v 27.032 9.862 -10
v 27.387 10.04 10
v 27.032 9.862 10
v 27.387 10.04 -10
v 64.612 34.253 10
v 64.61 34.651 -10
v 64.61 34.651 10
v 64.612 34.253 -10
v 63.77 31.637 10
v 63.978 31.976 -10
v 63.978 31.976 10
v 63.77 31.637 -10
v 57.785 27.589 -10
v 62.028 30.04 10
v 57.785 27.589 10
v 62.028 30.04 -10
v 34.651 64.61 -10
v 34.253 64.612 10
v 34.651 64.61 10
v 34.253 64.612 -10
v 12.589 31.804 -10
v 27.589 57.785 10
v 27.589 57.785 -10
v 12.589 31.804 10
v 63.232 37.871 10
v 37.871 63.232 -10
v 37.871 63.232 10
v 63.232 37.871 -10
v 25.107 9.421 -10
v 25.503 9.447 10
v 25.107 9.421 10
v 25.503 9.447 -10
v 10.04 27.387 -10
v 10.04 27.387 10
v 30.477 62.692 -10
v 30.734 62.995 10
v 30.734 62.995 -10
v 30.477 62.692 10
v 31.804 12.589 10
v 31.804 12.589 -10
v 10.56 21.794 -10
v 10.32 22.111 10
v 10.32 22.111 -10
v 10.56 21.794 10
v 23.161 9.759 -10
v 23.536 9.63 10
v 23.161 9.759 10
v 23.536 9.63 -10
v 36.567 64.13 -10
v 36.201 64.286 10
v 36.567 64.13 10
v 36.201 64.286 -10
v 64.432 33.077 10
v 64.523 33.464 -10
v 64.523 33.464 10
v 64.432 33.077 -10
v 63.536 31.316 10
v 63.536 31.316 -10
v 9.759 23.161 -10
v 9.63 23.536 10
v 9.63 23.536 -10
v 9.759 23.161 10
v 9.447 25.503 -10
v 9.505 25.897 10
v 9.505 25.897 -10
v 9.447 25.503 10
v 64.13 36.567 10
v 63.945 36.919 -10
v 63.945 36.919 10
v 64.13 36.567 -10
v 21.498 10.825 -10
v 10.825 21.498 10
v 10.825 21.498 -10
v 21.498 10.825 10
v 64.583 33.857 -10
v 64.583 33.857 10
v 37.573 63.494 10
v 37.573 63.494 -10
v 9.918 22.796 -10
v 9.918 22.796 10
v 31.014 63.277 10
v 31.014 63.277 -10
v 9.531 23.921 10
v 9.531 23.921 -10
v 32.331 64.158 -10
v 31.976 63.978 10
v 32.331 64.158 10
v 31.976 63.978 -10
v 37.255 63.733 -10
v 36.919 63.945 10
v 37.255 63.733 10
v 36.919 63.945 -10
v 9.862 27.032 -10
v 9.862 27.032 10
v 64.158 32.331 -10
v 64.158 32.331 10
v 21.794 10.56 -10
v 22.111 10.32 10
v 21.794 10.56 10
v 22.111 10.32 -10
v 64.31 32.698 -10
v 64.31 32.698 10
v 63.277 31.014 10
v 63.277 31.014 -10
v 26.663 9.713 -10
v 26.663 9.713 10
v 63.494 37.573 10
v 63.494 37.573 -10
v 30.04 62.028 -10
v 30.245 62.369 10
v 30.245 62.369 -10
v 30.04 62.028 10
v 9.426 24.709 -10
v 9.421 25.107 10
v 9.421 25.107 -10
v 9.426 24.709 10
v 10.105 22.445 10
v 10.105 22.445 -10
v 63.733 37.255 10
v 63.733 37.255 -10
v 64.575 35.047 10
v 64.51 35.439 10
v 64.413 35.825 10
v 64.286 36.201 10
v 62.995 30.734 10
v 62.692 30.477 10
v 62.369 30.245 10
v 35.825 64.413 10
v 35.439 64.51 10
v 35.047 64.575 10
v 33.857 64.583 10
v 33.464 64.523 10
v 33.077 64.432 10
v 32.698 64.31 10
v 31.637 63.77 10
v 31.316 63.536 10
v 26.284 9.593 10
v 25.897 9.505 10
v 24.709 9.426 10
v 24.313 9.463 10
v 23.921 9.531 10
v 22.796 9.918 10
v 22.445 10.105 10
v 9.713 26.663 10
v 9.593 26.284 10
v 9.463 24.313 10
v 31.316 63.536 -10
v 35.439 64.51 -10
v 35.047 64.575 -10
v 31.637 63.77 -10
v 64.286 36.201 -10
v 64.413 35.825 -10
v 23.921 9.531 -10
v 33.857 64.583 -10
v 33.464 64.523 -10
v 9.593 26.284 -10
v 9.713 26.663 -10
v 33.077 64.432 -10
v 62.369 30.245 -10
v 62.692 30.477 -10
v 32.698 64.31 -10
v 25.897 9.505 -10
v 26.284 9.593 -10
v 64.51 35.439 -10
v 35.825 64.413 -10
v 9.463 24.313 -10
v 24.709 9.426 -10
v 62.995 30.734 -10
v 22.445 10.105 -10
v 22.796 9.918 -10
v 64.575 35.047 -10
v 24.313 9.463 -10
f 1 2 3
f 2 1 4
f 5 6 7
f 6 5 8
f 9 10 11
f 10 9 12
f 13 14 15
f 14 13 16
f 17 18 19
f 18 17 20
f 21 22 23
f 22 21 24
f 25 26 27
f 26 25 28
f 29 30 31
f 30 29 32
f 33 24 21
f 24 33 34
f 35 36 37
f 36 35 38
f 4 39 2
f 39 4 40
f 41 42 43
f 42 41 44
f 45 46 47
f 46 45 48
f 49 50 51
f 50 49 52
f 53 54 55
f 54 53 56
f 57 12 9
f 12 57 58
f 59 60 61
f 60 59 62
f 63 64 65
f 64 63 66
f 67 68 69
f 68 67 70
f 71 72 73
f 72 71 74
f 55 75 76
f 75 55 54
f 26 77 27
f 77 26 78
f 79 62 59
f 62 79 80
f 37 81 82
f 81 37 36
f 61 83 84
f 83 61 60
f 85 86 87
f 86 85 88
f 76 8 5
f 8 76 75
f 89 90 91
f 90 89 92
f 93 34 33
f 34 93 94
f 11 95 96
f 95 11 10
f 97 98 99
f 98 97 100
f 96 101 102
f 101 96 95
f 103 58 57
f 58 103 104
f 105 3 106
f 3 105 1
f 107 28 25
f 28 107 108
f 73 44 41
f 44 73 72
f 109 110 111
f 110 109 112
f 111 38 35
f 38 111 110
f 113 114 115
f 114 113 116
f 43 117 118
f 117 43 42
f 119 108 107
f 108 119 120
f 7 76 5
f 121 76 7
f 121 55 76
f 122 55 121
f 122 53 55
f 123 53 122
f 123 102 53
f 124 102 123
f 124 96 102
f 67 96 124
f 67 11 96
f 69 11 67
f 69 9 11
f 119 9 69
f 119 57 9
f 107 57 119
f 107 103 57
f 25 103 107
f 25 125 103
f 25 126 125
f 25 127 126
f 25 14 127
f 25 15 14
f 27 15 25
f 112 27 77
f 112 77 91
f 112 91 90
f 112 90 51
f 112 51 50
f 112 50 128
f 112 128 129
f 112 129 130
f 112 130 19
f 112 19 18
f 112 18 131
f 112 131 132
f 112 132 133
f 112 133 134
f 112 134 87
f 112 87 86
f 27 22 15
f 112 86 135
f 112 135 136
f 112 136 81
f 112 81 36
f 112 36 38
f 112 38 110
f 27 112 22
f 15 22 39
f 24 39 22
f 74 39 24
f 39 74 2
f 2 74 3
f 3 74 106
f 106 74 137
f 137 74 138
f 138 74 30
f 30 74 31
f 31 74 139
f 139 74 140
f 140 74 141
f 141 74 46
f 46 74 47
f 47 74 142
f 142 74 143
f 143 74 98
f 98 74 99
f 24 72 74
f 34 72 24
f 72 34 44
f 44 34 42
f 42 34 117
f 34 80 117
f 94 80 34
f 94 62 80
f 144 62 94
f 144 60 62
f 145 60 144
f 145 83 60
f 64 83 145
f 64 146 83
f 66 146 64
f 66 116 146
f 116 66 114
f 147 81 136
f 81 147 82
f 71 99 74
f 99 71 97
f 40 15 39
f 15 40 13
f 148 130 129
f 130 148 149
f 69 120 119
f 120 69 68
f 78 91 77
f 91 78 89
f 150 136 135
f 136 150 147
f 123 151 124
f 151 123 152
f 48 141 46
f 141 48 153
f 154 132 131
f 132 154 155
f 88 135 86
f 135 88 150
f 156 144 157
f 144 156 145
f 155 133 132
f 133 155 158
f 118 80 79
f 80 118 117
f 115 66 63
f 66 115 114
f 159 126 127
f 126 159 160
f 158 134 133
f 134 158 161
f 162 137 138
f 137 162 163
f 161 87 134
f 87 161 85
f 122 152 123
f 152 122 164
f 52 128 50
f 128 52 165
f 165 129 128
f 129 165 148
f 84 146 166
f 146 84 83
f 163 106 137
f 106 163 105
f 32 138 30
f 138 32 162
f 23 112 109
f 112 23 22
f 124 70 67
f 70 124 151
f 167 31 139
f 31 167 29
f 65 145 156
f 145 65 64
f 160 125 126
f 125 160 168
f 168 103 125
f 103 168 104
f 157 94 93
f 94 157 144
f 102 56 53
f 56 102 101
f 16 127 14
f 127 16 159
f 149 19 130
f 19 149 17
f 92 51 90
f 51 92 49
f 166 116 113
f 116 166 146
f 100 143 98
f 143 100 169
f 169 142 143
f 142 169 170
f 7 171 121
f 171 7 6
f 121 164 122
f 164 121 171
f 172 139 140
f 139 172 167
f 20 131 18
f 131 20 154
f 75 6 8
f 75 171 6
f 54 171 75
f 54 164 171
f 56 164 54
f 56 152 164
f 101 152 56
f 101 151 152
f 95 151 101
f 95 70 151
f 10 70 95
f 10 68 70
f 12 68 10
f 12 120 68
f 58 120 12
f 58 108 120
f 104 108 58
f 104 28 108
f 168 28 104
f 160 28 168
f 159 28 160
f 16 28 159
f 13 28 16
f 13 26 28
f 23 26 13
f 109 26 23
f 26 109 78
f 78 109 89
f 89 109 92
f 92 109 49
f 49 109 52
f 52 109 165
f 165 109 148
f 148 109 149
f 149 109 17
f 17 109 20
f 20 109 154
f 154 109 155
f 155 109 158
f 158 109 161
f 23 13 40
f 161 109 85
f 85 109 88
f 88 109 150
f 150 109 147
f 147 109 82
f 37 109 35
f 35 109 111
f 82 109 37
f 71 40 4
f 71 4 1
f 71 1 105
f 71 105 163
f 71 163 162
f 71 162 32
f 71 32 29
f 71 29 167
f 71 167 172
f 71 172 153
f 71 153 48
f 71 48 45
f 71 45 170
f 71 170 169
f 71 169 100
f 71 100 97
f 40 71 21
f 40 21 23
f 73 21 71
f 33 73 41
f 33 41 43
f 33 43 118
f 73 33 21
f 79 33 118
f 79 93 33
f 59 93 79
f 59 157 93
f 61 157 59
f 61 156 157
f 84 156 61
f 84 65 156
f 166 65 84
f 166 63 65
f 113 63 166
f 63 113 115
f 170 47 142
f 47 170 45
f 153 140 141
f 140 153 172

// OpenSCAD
include <MCAD/bearing.scad>

// ---------------------------
// Constants
// ---------------------------
$fa = 1;
$fs = 0.4;
in_to_mm = 25.4;
gap = 1.25; //1/32 * in_to_mm;
nut_gap = 7;//3/4 * in_to_mm;
eps = .15;

bearingModel = 608; //608
bearing_w = bearingWidth(bearingModel);
bearing_or = bearingOuterDiameter(bearingModel)/2;
bearing_ir = bearingInnerDiameter(bearingModel)/2;


// ---------------------------
// Variables
// ---------------------------
num_holes=12;
sectors = num_holes;
sector_degrees = 360 / sectors;

mag1_hole_d = (4/8 * in_to_mm);
mag1_hole_r = (mag1_hole_d/2);
mag1_w = 5;//1/4 * in_to_mm;

mag2_hole_d = (2/8 * in_to_mm);
mag2_hole_r = (mag2_hole_d/2);
mag2_w = 1/4 * in_to_mm;

mag3_hole_d = (1/8 * in_to_mm);
mag3_hole_r = (mag3_hole_d/2);
mag3_w = 1/4 * in_to_mm;

mag_space_1 = 4;
mag_space_2 = 4;

cir = num_holes*2*5;//num_holes*2*(mag1_hole_d-mag_space_2/2);
temp_r = cir/(3.14159*2);
min_r = bearing_or + mag1_hole_d + mag2_hole_d;// + mag_space_2+3;
central_r3 = max(temp_r, min_r);
central_r2 = central_r3 + mag3_hole_r + mag_space_2 + mag2_hole_r;
central_r = central_r2 + mag2_hole_r + mag_space_1 + mag1_hole_r;
disk_r = central_r+2;

coil_cap_w = .6;
coil_w = bearing_w-1;//5;//(1/8 * in_to_mm = 3.175);
coil_hole_r = mag1_hole_r*3;
coil_hole_d = coil_hole_r*2;
coil_holder_r = mag1_hole_r;
coil_holder_bolt_r = 2;
coil_holder_top_insert_h = 1;
coil_holder_inner_shell_t = 2;
coil_holder_center_cyl_t = 1.5;
coil_center_hole_r = bearing_or+eps; //7

coil_holder_hull_r = 1;
wire_size = 2.5;//mag1_hole_r-5;
coil_holder_out_r1 = central_r3-wire_size;//-mag2_hole_r;
coil_holder_out_x1 = coil_holder_out_r1-coil_holder_hull_r/num_holes;
coil_holder_out_y1 = wire_size-coil_holder_hull_r;
coil_holder_out_r2 = central_r+mag1_hole_d+mag_space_1;
coil_holder_out_x2 = coil_holder_out_r2;
coil_holder_out_y2 = wire_size-coil_holder_hull_r;

coil_holder_in_x1 = coil_holder_out_r1+wire_size*2+coil_holder_hull_r/2;
coil_holder_in_y1 = wire_size+coil_holder_hull_r;
coil_holder_in_x2 = coil_holder_out_r2-wire_size-coil_holder_hull_r*2;
coil_holder_in_y2 = wire_size+coil_holder_hull_r;
coil_holder_in_len = coil_holder_in_x2 - coil_holder_in_x1 + coil_holder_hull_r*2;
echo(str("coil_holder_in_len:", coil_holder_in_len));

base_d = 170;
base_r = base_d/2;  //central_r + coil_hole_d;
base_w = 3; //bearing_w/1.75
base_l = 70; //3.5 * in_to_mm; 66.4
base_lc = nut_gap + gap + mag2_w + gap + coil_w +gap + mag1_w + gap + coil_w + gap + mag1_w + gap + coil_w + gap + mag2_w + gap + nut_gap;
base_side_h = 15;
alignment_bolt_r = 3.9/2;

axel_h = gap+coil_w+gap;
axel_ir = bearing_ir+.1;
axel_or = coil_center_hole_r-1;

echo(str("sector_degrees:", sector_degrees));
echo(str("coil_w:", coil_w));
echo(str("bearing_w:", bearing_w));
echo(str("mag1_w:", mag1_w));
echo(str("mag1_hole_r:", mag1_hole_r));
echo(str("disk_r:", disk_r));

render_mode = "JOE"; //"FULL", "PRINT", "TEST";
print_mode = "MAG1"; //"MAG1","COIL","HOLDERS","BASE";

//%translate([0,0,10])coilDisk(diskNum=1, bearing=true);
//barMagDisk();
//printCoilHolderTopAndBot();

//square([30,10], center=true);
barMagCoilHolderOuterHull();

//barMagDisk();
//%coilHoldersVisual();

// Disk
module barMagDisk() {
    border = mag1_hole_r;
    mag1_disk_r = central_r + border+11.5;
    w=mag1_w;
    
    difference() {
        cylinder(h=w,r=mag1_disk_r,center=true);
        //remove holes for outer magnets
        barMagHoles(mag1_disk_r, border);
        //remove hole for main axel
        cylinder(h=w*2,r=axel_ir,center=true);
    }
}

module barMagHole(r,b,x=30,y=10,z=20) {
    translate([r-(x/2)-b,0,0])cube([x, y, z], center=true);
}

module barMagHoles(r,b,x=30,y=10,z=20) {
    sectors = num_holes;
    sector_degrees = 360 / sectors;
    for(sector = [1 : sectors]) {
        angle = sector_degrees * sector;
        rotate([0,0,angle])barMagHole(r,b,x,y,z);
    }    
}

module barMagCoilHolderOuterHull() {
    border = mag1_hole_r;
    mag1_disk_r = central_r + border+11.5;
    w=mag1_w;
    
    hull() {
        barMagCoilOutlines(mag1_disk_r, border);
    }
    hull() {
        barMagCoilInlines(mag1_disk_r, border);
    }
    
    
}

module barMagCoilOut(r,b,x=30,y=10,z=20) {
    offset = x/2 + y/2;
    translate([r-(x/2)-b,0,0]){
        #translate([offset,0,0])cylinder(h=z,r=y/2,center=true);
        #cube([x, y, z], center=true);
        #translate([-offset,0,0])cylinder(h=z,r=y/2,center=true);
    }
}

module barMagCoilOutlines(r,b,x=30,y=10,z=20) {
    sectors = num_holes;
    sector_degrees = 360 / sectors;
    for(sector = [1 : 2]) {
        angle = sector_degrees * sector;
        rotate([0,0,angle])barMagCoilOut(r,b,x,y,z);
    }    
}


module barMagCoilIn(r,b,sector,x=30,y=10,z=20) {
    r_in = 1;
    x_off = x/2;
    y_off = y/2 + r_in;
    echo(str("sector:", sector));
    if (sector == 2) {
        translate([r-(x/2)-b,0,0]){
            #translate([x_off,-y_off,0])cylinder(h=z,r=r_in,center=true);
            %translate([0,-y_off,0])cube([x, r_in*2, z], center=true);
            #translate([-x_off,-y_off,0])cylinder(h=z,r=r_in,center=true);
        }
    } else {
        translate([r-(x/2)-b,0,0]){
            #translate([x_off,y_off,0])cylinder(h=z,r=r_in,center=true);
            %translate([0,y_off,0])cube([x, r_in*2, z], center=true);
            #translate([-x_off,y_off,0])cylinder(h=z,r=r_in,center=true);
        }
    }
}

module barMagCoilInlines(r,b,x=30,y=10,z=20) {
    sectors = num_holes;
    sector_degrees = 360 / sectors;
    for(sector = [1 : 2]) {
        angle = sector_degrees * sector;
        rotate([0,0,angle])barMagCoilIn(r,b,sector,x,y,z);
    }    
}



// Main rendering code
if (render_mode=="FULL") {
    renderFull();
} else if (render_mode=="PRINT") {
    renderPrint();
} else if (render_mode=="TEST") {
    renderTest();
}

module renderFull() {
    rotate([-90,0,90]) {
        // Coil Disk
        coilDisk(diskNum=1, bearing=true);
        // Base
        //base();
        // Rotating Magnet Disks
        z_offset = (mag1_w + bearing_w)/2;
        inv_num_holes = 1/num_holes;
        tmp_t = inv_num_holes*2; //0=blue, 1=white, 2=yellow, 3=green
        // For animate use: fps=1, steps=12
        rotate([0,0,(-sector_degrees/(num_holes/2))*$t*num_holes]) {
            translate([0,0,z_offset])
            %barMagDisk();
            translate([0,0,-z_offset])
            %barMagDisk();
        }

        // Coil Holders - Yellow
        tr1=1;//3/num_holes;//0.0;//0.125;
        color("yellow", 1.0) {
            rotate([0,0,(-sector_degrees/2)*tr1]) {
                translate([0,0,-coil_w/2])coilHoldersVisual();
            }
        }
//    tr2=0.5;
//    color( "white", 1.0 ) {
//        rotate([0,0,(-sector_degrees/2)*tr2]) {
//            coilHoldersVisual();
//        }
//    }
//    tr3=1.5;
//    color( "green", 1.0 ) {
//        rotate([0,0,(-sector_degrees/2)*tr3]) {
//            coilHoldersVisual();        
//        }
//    }
//    tr4=2;
//    color( "blue", 1.0 ) {
//        rotate([0,0,(-sector_degrees/2)*tr4]) {    
//            coilHoldersVisual();    
//        }
//    } 
    }
}

module renderPrint() {
    if (print_mode=="MAG1") {
        // Magnet Disk1
        mag1Disk();
    } else if (print_mode=="COIL") {
        // COIL Disk
        if (num_holes==12) {
            coilDisk(diskNum=3);
        } else {
            coilDisk();
        }
    } else if (print_mode=="HOLDERS") {
        // Wire coil holders
        printCoilHolderTopAndBot();
    } else if (print_mode=="BASE") {
        // Base
        basePrint();
    }
}

// ---------------------------------------
// Stationary Coil Disk Modules
// ---------------------------------------

// Stationary Disk with trapezoid coils
module coilDisk(w=coil_w, diskNum=1, wires=true, bearing=false) {
    x = base_d-1.5;
    y = x;
    small_hole_r = 1;
    small_hole_or = central_r+mag1_hole_d+coil_hole_r-5;
    // Disk
    difference() {
        //main structure
        //cube([x, y, w], center=true);
        cylinder(h=w,r=base_d/2,center=true);
        //remove trapezoids for coils
        rotate([0,0,(-sector_degrees/2)*diskNum]) {
            translate([0,0,-w])coilHoldersOutline(w=w*2,offset_r=eps);
        }
        // remove center hole for bearing
        cylinder(h=w*2,r=coil_center_hole_r,center=true);
        // remove holes for wires
        if (wires == true) {
            //wireChannelsStraight();
            structureHoles(w=w,radius=small_hole_or, hole_r=small_hole_r);
        }
        alignmentBoltHoles(w=w);
    }
    if (bearing == true) {
        translate([0, 0, -bearing_w/2])
        bearing(model=bearingModel, outline=false);
    }
}

//alignment_bolt_r
module alignmentBoltHoles(w=coil_w, r=alignment_bolt_r, i=10) {
    translate([base_r-i,base_r-i,0])cylinder(h=w*2,r=r,center=true);
    translate([-base_r+i,base_r-i,0])cylinder(h=w*2,r=r,center=true);
    translate([base_r-i,-base_r+i,0])cylinder(h=w*2,r=r,center=true);
    translate([-base_r+i,-base_r+i,0])cylinder(h=w*2,r=r,center=true);
}

module wireChannelsStraight() {
    radius = central_r+mag1_hole_d;
    sectors = num_holes/2;
    degrees = 360 / sectors;
    cyl_h = radius*(12/num_holes)-2;
    
    for(sector = [1 : sectors]) {
        angle = degrees * sector;
        x_pos = radius * sin(angle);
        y_pos = radius * cos(angle);
        x_off = (coil_hole_r) * cos(angle);
        y_off = (coil_hole_r) * sin(angle);
        cross_angle_1 = degrees/2-(angle+90);
        cross_angle_2 = degrees/2-(angle+degrees-90);
        rotate([0,0,degrees/2]) {
            translate([x_pos+y_off,y_pos+x_off,coil_w/2]){
                rotate([90,0,cross_angle_1])cylinder(h=cyl_h,r=coil_w/4,center=false);
            }
        }
        rotate([0,0,degrees/2]) {
            translate([x_pos+y_off,y_pos+x_off,coil_w/2]){
                rotate([90,0,cross_angle_2])cylinder(h=cyl_h,r=coil_w/4,center=false);
            }
        }
    }    
}

// ---------------------------------------
// Rotating Magnet Disk Modules
// ---------------------------------------

// Rotating Disk with magnets #1
module mag1Disk(w=mag1_w) {
    border = mag1_hole_r*1.5;
    mag1_disk_r = central_r + border;
    
    // Disk
    difference() {
        cylinder(h=w,r=mag1_disk_r,center=true);
        //remove holes for outer magnets
        holes(w*2, mag1_hole_r+eps);
        //remove holes for center magnets
        holes(w*2, mag2_hole_r+eps, radius=central_r2);
        //remove holes for inner magnets
        holes(w*2, mag3_hole_r+eps, radius=central_r3);
        //remove hole for main axel
        cylinder(h=w*2,r=axel_ir,center=true);
    }
}


// Rotating Disk with magnets #1
module mag1Disk_old(w=mag1_w) {
    border = mag1_hole_r*1.5;
    mag1_disk_r = central_r + border;
    
    // Disk
    difference() {
        cylinder(h=w,r=mag1_disk_r,center=true);
        //remove holes for outer magnets
        holes(w*2, mag1_hole_r+eps);
        //remove holes for center magnets
        holes(w*2, mag2_hole_r+eps, radius=central_r2);
        //remove holes for inner magnets
        holes(w*2, mag3_hole_r+eps, radius=central_r3);
        //remove hole for main axel
        cylinder(h=w*2,r=axel_ir,center=true);
    }
}


// ---------------------------------------
// Coil Holder Modules
// ---------------------------------------

module printCoilHolderTopAndBot() { 
    centerCoilHolder() {
        coilHolderBottom();
    }    
    translate([0,-coil_holder_center_r-2,0])rotate([0,0,180]){
        centerCoilHolder() {
            coilHolderTop();
        }    
    }
}

module centerCoilHolder() { 
    angle = 90-(sector_degrees/2);
    radius = coil_holder_center_r;
    x_pos = radius * sin(angle);
    y_pos = radius * cos(angle);

    translate([-x_pos,-y_pos,0]) children(); 
}

module coilHolderBottom() {
    h=coil_w-coil_cap_w;
    difference() {
        union() {
            coilHolderCap(holes=true);
            innerCoilHolderShell(h=h);
            coilHolderCenterCylinder(h=h);
        }
        coilHolderCenterBoltHole();
    }
}

module innerCoilHolderShell(h=coil_w) {
    linear_extrude(height=h, slices=10) {
        difference() {
            innerCoilHolder2d();
            offset(r=-coil_holder_inner_shell_t) {
                innerCoilHolder2d();
            }
        }
    }
}

module coilHolderTop() {
    difference() {
        union() {
            coilHolderCap();
            coilHolderTopInsert();
        }
        coilHolderCenterCylinder(t=coil_holder_center_cyl_t+eps,z=coil_cap_w);
        coilHolderCenterBoltHole();
    }
}

module coilHolderTopInsert(h=coil_holder_top_insert_h, z=coil_cap_w) {
    translate([0,0,z]) {
        linear_extrude(height=h, slices=1) {
            offset(r=-(coil_holder_inner_shell_t+eps)) {
                innerCoilHolder2d();
            }
        }
    }
}

module coilHolderCap(w=coil_cap_w, holes=false) {
    translate([0,0,w/2])outerCoilHolder(w=w, holes=holes);
}

module coilHolderCenterCylinder(h=coil_w, r=coil_holder_bolt_r, t=coil_holder_center_cyl_t, z=0) {
    rotate([0,0,(sector_degrees/2)])
        translate([coil_holder_center_r,0,z]) 
            cylinder(h=h,r=r+t);
}

module coilHolderCenterBoltHole() {
    coilHolderCenterCylinder(h=coil_w*3,t=eps,z=-coil_w);
}

// Coil Holders Visual
module coilHoldersVisual(w=coil_w) {
    for(sector = [0 : 2 : sectors]) {
        rotate([0,0,sector_degrees*sector]) { 
            outerCoilHolder(w=w);
            #translate([0,0,w/2])innerCoilHolder(w=w+2);
        }
    }    
}

module coilHoldersOutline(w=coil_w, offset_r=0) {
    for(sector = [0 : 2 : sectors]) {
        rotate([0,0,sector_degrees*sector]) { 
            outerCoilHolder(w=w,offset_r=offset_r);
        }
    }    
}

// Outer coil holder
module outerCoilHolder(w=coil_w, offset_r=0, holes=false) {
    difference() {
        linear_extrude(height=w, slices=1) {
            offset(r=offset_r) {
                outerCoilHolder2d();
            }
        }
        if (holes == true) {
            translate([coil_holder_out_x2+mag1_hole_r/1.1, 0, 0])
            cylinder(h=w*2,r=1,center=true);
            rotate([0,0,sector_degrees]) {
                translate([coil_holder_out_x2, 0, 0])
                cylinder(h=w*2,r=1,center=true);
            }
            
        }
    }
}

module outerCoilHolder2d(w=coil_w, offset_r=0) {
    hull() {
        translate([coil_holder_out_x1, -coil_holder_out_y1, 0])
        circle(r=coil_holder_hull_r);
        translate([coil_holder_out_x2, 0, 0])
        circle(r=mag1_hole_r);

        rotate([0,0,sector_degrees]) {
            translate([coil_holder_out_x1, coil_holder_out_y1, 0])
            circle(r=coil_holder_hull_r);
            translate([coil_holder_out_x2, 0, 0])
            circle(r=mag1_hole_r);
        }
    }
}


// Inner coil holder
module innerCoilHolder(w=coil_w) {
    hull() {
        translate([coil_holder_in_x1, coil_holder_in_y1, 0])
        cylinder(h=w,r=coil_holder_hull_r,center=true);
        translate([coil_holder_in_x2, coil_holder_in_y2, 0])
        cylinder(h=w,r=coil_holder_hull_r,center=true);

        rotate([0,0,sector_degrees]) {
        translate([coil_holder_in_x1, -coil_holder_in_y1, 0])
        cylinder(h=w,r=coil_holder_hull_r,center=true);
        translate([coil_holder_in_x2, -coil_holder_in_y2, 0])
        cylinder(h=w,r=coil_holder_hull_r,center=true);
        }
    }
}

// Inner coil holder 2D
module innerCoilHolder2d() {
    hull() {
        translate([coil_holder_in_x1, coil_holder_in_y1, 0])
        circle(r=coil_holder_hull_r);
        translate([coil_holder_in_x2, coil_holder_in_y2, 0])
        circle(r=coil_holder_hull_r);

        rotate([0,0,sector_degrees]) {
        translate([coil_holder_in_x1, -coil_holder_in_y1, 0])
        circle(r=coil_holder_hull_r);
        translate([coil_holder_in_x2, -coil_holder_in_y2, 0])
        circle(r=coil_holder_hull_r);
        }
    }
}

// ---------------------------------------
// Base Related Modules
// ---------------------------------------

module basePrint(base_sup_x = 19, base_sup_y = 18) {
    base_x = base_d+10;
    base_y = coil_w*1.25;
    base_yo = base_r+base_y/2-1;
    w = coil_w + eps*3;
    rotate([-90,0,90])translate([0,-base_yo,0]) {
        base(base_sup_x=base_sup_x, base_sup_y=base_sup_y);
    }
}

module base(base_sup_x = 19, base_sup_y = 18) {
    base_x = base_d+10;
    base_y = coil_w*1.25;
    base_yo = base_r+base_y/2-1;
    w = coil_w + eps*3;
    difference() {
        baseStructure(base_sup_x=base_sup_x, base_sup_y=base_sup_y);
        // Remove COIL Disk
        if (num_holes==12) {
            coilDisk(w=w, diskNum=3);
        } else {
            coilDisk(w=w);
        }
        alignmentBoltHoles(w=w*2,r=alignment_bolt_r+eps);
    }
}

module baseStructure(base_sup_x=19, base_sup_y=18) {
    base_x = base_d+10;
    base_y = coil_w*1.25;
    base_yo = base_r+base_y/2-1;
    base_z = coil_w*7;
    base_sup_xo = (base_x-base_sup_x)/2-2;
    base_sup_yo = base_yo - base_sup_y/2;
    base_sup_z = coil_w*3;
    translate([0,base_yo,0])
    cube([base_x,base_y,base_z], center=true);
    translate([base_sup_xo,base_sup_yo,0])
    cube([base_sup_x,base_sup_y,base_sup_z], center=true);
    translate([-base_sup_xo,base_sup_yo,0])
    cube([base_sup_x,base_sup_y,base_sup_z], center=true);
}

// ---------------------------------------
// Common Modules
// ---------------------------------------

module holes(w, hole_r, radius=central_r) {
    //radius = central_r;
    sectors = num_holes;
    sector_degrees = 360 / sectors;

    for(sector = [1 : sectors]) {
        angle = sector_degrees * sector;
        x_pos = radius * sin(angle);
        y_pos = radius * cos(angle);
        translate([x_pos,y_pos,0]){
            hole(w, hole_r);
        }
    }    
}

module structureHoles(w, radius, hole_r, sectors=num_holes) {
    sector_degrees = 360 / sectors;
    for(sector = [1 : 2 : sectors]) {
        angle = sector_degrees * sector;
        x_pos = radius * sin(angle);
        y_pos = radius * cos(angle);
        translate([x_pos,y_pos,0]){
            hole(w, hole_r);
        }
    }    
}

module hole(w, hole_r) {
    cylinder(h=w+2,r=hole_r,center=true);
}


// ---------------------------------------
// Test Print Module
// ---------------------------------------

module renderTest() {
    translate([0,0,coil_w/2]) {
        difference() {
            translate([0,5,0])cube([50,50,coil_w], center=true);
            
            //Big Magnet hole
            translate([20,25,0])hole(mag1_w, mag1_hole_r+eps); 

            //Small Magnet hole
            translate([20,15,0])hole(mag2_w, mag2_hole_r+eps); 
            
            //Bearing hole
            translate([-15,20,0])
            cylinder(h=bearing_w*2,r=coil_center_hole_r,center=true);
            
            //CoilHolder
            centerCoilHolder() {
                translate([0,0,-coil_w])outerCoilHolder(w=coil_w*2,offset_r=eps);
            }    
        }
    }
}
